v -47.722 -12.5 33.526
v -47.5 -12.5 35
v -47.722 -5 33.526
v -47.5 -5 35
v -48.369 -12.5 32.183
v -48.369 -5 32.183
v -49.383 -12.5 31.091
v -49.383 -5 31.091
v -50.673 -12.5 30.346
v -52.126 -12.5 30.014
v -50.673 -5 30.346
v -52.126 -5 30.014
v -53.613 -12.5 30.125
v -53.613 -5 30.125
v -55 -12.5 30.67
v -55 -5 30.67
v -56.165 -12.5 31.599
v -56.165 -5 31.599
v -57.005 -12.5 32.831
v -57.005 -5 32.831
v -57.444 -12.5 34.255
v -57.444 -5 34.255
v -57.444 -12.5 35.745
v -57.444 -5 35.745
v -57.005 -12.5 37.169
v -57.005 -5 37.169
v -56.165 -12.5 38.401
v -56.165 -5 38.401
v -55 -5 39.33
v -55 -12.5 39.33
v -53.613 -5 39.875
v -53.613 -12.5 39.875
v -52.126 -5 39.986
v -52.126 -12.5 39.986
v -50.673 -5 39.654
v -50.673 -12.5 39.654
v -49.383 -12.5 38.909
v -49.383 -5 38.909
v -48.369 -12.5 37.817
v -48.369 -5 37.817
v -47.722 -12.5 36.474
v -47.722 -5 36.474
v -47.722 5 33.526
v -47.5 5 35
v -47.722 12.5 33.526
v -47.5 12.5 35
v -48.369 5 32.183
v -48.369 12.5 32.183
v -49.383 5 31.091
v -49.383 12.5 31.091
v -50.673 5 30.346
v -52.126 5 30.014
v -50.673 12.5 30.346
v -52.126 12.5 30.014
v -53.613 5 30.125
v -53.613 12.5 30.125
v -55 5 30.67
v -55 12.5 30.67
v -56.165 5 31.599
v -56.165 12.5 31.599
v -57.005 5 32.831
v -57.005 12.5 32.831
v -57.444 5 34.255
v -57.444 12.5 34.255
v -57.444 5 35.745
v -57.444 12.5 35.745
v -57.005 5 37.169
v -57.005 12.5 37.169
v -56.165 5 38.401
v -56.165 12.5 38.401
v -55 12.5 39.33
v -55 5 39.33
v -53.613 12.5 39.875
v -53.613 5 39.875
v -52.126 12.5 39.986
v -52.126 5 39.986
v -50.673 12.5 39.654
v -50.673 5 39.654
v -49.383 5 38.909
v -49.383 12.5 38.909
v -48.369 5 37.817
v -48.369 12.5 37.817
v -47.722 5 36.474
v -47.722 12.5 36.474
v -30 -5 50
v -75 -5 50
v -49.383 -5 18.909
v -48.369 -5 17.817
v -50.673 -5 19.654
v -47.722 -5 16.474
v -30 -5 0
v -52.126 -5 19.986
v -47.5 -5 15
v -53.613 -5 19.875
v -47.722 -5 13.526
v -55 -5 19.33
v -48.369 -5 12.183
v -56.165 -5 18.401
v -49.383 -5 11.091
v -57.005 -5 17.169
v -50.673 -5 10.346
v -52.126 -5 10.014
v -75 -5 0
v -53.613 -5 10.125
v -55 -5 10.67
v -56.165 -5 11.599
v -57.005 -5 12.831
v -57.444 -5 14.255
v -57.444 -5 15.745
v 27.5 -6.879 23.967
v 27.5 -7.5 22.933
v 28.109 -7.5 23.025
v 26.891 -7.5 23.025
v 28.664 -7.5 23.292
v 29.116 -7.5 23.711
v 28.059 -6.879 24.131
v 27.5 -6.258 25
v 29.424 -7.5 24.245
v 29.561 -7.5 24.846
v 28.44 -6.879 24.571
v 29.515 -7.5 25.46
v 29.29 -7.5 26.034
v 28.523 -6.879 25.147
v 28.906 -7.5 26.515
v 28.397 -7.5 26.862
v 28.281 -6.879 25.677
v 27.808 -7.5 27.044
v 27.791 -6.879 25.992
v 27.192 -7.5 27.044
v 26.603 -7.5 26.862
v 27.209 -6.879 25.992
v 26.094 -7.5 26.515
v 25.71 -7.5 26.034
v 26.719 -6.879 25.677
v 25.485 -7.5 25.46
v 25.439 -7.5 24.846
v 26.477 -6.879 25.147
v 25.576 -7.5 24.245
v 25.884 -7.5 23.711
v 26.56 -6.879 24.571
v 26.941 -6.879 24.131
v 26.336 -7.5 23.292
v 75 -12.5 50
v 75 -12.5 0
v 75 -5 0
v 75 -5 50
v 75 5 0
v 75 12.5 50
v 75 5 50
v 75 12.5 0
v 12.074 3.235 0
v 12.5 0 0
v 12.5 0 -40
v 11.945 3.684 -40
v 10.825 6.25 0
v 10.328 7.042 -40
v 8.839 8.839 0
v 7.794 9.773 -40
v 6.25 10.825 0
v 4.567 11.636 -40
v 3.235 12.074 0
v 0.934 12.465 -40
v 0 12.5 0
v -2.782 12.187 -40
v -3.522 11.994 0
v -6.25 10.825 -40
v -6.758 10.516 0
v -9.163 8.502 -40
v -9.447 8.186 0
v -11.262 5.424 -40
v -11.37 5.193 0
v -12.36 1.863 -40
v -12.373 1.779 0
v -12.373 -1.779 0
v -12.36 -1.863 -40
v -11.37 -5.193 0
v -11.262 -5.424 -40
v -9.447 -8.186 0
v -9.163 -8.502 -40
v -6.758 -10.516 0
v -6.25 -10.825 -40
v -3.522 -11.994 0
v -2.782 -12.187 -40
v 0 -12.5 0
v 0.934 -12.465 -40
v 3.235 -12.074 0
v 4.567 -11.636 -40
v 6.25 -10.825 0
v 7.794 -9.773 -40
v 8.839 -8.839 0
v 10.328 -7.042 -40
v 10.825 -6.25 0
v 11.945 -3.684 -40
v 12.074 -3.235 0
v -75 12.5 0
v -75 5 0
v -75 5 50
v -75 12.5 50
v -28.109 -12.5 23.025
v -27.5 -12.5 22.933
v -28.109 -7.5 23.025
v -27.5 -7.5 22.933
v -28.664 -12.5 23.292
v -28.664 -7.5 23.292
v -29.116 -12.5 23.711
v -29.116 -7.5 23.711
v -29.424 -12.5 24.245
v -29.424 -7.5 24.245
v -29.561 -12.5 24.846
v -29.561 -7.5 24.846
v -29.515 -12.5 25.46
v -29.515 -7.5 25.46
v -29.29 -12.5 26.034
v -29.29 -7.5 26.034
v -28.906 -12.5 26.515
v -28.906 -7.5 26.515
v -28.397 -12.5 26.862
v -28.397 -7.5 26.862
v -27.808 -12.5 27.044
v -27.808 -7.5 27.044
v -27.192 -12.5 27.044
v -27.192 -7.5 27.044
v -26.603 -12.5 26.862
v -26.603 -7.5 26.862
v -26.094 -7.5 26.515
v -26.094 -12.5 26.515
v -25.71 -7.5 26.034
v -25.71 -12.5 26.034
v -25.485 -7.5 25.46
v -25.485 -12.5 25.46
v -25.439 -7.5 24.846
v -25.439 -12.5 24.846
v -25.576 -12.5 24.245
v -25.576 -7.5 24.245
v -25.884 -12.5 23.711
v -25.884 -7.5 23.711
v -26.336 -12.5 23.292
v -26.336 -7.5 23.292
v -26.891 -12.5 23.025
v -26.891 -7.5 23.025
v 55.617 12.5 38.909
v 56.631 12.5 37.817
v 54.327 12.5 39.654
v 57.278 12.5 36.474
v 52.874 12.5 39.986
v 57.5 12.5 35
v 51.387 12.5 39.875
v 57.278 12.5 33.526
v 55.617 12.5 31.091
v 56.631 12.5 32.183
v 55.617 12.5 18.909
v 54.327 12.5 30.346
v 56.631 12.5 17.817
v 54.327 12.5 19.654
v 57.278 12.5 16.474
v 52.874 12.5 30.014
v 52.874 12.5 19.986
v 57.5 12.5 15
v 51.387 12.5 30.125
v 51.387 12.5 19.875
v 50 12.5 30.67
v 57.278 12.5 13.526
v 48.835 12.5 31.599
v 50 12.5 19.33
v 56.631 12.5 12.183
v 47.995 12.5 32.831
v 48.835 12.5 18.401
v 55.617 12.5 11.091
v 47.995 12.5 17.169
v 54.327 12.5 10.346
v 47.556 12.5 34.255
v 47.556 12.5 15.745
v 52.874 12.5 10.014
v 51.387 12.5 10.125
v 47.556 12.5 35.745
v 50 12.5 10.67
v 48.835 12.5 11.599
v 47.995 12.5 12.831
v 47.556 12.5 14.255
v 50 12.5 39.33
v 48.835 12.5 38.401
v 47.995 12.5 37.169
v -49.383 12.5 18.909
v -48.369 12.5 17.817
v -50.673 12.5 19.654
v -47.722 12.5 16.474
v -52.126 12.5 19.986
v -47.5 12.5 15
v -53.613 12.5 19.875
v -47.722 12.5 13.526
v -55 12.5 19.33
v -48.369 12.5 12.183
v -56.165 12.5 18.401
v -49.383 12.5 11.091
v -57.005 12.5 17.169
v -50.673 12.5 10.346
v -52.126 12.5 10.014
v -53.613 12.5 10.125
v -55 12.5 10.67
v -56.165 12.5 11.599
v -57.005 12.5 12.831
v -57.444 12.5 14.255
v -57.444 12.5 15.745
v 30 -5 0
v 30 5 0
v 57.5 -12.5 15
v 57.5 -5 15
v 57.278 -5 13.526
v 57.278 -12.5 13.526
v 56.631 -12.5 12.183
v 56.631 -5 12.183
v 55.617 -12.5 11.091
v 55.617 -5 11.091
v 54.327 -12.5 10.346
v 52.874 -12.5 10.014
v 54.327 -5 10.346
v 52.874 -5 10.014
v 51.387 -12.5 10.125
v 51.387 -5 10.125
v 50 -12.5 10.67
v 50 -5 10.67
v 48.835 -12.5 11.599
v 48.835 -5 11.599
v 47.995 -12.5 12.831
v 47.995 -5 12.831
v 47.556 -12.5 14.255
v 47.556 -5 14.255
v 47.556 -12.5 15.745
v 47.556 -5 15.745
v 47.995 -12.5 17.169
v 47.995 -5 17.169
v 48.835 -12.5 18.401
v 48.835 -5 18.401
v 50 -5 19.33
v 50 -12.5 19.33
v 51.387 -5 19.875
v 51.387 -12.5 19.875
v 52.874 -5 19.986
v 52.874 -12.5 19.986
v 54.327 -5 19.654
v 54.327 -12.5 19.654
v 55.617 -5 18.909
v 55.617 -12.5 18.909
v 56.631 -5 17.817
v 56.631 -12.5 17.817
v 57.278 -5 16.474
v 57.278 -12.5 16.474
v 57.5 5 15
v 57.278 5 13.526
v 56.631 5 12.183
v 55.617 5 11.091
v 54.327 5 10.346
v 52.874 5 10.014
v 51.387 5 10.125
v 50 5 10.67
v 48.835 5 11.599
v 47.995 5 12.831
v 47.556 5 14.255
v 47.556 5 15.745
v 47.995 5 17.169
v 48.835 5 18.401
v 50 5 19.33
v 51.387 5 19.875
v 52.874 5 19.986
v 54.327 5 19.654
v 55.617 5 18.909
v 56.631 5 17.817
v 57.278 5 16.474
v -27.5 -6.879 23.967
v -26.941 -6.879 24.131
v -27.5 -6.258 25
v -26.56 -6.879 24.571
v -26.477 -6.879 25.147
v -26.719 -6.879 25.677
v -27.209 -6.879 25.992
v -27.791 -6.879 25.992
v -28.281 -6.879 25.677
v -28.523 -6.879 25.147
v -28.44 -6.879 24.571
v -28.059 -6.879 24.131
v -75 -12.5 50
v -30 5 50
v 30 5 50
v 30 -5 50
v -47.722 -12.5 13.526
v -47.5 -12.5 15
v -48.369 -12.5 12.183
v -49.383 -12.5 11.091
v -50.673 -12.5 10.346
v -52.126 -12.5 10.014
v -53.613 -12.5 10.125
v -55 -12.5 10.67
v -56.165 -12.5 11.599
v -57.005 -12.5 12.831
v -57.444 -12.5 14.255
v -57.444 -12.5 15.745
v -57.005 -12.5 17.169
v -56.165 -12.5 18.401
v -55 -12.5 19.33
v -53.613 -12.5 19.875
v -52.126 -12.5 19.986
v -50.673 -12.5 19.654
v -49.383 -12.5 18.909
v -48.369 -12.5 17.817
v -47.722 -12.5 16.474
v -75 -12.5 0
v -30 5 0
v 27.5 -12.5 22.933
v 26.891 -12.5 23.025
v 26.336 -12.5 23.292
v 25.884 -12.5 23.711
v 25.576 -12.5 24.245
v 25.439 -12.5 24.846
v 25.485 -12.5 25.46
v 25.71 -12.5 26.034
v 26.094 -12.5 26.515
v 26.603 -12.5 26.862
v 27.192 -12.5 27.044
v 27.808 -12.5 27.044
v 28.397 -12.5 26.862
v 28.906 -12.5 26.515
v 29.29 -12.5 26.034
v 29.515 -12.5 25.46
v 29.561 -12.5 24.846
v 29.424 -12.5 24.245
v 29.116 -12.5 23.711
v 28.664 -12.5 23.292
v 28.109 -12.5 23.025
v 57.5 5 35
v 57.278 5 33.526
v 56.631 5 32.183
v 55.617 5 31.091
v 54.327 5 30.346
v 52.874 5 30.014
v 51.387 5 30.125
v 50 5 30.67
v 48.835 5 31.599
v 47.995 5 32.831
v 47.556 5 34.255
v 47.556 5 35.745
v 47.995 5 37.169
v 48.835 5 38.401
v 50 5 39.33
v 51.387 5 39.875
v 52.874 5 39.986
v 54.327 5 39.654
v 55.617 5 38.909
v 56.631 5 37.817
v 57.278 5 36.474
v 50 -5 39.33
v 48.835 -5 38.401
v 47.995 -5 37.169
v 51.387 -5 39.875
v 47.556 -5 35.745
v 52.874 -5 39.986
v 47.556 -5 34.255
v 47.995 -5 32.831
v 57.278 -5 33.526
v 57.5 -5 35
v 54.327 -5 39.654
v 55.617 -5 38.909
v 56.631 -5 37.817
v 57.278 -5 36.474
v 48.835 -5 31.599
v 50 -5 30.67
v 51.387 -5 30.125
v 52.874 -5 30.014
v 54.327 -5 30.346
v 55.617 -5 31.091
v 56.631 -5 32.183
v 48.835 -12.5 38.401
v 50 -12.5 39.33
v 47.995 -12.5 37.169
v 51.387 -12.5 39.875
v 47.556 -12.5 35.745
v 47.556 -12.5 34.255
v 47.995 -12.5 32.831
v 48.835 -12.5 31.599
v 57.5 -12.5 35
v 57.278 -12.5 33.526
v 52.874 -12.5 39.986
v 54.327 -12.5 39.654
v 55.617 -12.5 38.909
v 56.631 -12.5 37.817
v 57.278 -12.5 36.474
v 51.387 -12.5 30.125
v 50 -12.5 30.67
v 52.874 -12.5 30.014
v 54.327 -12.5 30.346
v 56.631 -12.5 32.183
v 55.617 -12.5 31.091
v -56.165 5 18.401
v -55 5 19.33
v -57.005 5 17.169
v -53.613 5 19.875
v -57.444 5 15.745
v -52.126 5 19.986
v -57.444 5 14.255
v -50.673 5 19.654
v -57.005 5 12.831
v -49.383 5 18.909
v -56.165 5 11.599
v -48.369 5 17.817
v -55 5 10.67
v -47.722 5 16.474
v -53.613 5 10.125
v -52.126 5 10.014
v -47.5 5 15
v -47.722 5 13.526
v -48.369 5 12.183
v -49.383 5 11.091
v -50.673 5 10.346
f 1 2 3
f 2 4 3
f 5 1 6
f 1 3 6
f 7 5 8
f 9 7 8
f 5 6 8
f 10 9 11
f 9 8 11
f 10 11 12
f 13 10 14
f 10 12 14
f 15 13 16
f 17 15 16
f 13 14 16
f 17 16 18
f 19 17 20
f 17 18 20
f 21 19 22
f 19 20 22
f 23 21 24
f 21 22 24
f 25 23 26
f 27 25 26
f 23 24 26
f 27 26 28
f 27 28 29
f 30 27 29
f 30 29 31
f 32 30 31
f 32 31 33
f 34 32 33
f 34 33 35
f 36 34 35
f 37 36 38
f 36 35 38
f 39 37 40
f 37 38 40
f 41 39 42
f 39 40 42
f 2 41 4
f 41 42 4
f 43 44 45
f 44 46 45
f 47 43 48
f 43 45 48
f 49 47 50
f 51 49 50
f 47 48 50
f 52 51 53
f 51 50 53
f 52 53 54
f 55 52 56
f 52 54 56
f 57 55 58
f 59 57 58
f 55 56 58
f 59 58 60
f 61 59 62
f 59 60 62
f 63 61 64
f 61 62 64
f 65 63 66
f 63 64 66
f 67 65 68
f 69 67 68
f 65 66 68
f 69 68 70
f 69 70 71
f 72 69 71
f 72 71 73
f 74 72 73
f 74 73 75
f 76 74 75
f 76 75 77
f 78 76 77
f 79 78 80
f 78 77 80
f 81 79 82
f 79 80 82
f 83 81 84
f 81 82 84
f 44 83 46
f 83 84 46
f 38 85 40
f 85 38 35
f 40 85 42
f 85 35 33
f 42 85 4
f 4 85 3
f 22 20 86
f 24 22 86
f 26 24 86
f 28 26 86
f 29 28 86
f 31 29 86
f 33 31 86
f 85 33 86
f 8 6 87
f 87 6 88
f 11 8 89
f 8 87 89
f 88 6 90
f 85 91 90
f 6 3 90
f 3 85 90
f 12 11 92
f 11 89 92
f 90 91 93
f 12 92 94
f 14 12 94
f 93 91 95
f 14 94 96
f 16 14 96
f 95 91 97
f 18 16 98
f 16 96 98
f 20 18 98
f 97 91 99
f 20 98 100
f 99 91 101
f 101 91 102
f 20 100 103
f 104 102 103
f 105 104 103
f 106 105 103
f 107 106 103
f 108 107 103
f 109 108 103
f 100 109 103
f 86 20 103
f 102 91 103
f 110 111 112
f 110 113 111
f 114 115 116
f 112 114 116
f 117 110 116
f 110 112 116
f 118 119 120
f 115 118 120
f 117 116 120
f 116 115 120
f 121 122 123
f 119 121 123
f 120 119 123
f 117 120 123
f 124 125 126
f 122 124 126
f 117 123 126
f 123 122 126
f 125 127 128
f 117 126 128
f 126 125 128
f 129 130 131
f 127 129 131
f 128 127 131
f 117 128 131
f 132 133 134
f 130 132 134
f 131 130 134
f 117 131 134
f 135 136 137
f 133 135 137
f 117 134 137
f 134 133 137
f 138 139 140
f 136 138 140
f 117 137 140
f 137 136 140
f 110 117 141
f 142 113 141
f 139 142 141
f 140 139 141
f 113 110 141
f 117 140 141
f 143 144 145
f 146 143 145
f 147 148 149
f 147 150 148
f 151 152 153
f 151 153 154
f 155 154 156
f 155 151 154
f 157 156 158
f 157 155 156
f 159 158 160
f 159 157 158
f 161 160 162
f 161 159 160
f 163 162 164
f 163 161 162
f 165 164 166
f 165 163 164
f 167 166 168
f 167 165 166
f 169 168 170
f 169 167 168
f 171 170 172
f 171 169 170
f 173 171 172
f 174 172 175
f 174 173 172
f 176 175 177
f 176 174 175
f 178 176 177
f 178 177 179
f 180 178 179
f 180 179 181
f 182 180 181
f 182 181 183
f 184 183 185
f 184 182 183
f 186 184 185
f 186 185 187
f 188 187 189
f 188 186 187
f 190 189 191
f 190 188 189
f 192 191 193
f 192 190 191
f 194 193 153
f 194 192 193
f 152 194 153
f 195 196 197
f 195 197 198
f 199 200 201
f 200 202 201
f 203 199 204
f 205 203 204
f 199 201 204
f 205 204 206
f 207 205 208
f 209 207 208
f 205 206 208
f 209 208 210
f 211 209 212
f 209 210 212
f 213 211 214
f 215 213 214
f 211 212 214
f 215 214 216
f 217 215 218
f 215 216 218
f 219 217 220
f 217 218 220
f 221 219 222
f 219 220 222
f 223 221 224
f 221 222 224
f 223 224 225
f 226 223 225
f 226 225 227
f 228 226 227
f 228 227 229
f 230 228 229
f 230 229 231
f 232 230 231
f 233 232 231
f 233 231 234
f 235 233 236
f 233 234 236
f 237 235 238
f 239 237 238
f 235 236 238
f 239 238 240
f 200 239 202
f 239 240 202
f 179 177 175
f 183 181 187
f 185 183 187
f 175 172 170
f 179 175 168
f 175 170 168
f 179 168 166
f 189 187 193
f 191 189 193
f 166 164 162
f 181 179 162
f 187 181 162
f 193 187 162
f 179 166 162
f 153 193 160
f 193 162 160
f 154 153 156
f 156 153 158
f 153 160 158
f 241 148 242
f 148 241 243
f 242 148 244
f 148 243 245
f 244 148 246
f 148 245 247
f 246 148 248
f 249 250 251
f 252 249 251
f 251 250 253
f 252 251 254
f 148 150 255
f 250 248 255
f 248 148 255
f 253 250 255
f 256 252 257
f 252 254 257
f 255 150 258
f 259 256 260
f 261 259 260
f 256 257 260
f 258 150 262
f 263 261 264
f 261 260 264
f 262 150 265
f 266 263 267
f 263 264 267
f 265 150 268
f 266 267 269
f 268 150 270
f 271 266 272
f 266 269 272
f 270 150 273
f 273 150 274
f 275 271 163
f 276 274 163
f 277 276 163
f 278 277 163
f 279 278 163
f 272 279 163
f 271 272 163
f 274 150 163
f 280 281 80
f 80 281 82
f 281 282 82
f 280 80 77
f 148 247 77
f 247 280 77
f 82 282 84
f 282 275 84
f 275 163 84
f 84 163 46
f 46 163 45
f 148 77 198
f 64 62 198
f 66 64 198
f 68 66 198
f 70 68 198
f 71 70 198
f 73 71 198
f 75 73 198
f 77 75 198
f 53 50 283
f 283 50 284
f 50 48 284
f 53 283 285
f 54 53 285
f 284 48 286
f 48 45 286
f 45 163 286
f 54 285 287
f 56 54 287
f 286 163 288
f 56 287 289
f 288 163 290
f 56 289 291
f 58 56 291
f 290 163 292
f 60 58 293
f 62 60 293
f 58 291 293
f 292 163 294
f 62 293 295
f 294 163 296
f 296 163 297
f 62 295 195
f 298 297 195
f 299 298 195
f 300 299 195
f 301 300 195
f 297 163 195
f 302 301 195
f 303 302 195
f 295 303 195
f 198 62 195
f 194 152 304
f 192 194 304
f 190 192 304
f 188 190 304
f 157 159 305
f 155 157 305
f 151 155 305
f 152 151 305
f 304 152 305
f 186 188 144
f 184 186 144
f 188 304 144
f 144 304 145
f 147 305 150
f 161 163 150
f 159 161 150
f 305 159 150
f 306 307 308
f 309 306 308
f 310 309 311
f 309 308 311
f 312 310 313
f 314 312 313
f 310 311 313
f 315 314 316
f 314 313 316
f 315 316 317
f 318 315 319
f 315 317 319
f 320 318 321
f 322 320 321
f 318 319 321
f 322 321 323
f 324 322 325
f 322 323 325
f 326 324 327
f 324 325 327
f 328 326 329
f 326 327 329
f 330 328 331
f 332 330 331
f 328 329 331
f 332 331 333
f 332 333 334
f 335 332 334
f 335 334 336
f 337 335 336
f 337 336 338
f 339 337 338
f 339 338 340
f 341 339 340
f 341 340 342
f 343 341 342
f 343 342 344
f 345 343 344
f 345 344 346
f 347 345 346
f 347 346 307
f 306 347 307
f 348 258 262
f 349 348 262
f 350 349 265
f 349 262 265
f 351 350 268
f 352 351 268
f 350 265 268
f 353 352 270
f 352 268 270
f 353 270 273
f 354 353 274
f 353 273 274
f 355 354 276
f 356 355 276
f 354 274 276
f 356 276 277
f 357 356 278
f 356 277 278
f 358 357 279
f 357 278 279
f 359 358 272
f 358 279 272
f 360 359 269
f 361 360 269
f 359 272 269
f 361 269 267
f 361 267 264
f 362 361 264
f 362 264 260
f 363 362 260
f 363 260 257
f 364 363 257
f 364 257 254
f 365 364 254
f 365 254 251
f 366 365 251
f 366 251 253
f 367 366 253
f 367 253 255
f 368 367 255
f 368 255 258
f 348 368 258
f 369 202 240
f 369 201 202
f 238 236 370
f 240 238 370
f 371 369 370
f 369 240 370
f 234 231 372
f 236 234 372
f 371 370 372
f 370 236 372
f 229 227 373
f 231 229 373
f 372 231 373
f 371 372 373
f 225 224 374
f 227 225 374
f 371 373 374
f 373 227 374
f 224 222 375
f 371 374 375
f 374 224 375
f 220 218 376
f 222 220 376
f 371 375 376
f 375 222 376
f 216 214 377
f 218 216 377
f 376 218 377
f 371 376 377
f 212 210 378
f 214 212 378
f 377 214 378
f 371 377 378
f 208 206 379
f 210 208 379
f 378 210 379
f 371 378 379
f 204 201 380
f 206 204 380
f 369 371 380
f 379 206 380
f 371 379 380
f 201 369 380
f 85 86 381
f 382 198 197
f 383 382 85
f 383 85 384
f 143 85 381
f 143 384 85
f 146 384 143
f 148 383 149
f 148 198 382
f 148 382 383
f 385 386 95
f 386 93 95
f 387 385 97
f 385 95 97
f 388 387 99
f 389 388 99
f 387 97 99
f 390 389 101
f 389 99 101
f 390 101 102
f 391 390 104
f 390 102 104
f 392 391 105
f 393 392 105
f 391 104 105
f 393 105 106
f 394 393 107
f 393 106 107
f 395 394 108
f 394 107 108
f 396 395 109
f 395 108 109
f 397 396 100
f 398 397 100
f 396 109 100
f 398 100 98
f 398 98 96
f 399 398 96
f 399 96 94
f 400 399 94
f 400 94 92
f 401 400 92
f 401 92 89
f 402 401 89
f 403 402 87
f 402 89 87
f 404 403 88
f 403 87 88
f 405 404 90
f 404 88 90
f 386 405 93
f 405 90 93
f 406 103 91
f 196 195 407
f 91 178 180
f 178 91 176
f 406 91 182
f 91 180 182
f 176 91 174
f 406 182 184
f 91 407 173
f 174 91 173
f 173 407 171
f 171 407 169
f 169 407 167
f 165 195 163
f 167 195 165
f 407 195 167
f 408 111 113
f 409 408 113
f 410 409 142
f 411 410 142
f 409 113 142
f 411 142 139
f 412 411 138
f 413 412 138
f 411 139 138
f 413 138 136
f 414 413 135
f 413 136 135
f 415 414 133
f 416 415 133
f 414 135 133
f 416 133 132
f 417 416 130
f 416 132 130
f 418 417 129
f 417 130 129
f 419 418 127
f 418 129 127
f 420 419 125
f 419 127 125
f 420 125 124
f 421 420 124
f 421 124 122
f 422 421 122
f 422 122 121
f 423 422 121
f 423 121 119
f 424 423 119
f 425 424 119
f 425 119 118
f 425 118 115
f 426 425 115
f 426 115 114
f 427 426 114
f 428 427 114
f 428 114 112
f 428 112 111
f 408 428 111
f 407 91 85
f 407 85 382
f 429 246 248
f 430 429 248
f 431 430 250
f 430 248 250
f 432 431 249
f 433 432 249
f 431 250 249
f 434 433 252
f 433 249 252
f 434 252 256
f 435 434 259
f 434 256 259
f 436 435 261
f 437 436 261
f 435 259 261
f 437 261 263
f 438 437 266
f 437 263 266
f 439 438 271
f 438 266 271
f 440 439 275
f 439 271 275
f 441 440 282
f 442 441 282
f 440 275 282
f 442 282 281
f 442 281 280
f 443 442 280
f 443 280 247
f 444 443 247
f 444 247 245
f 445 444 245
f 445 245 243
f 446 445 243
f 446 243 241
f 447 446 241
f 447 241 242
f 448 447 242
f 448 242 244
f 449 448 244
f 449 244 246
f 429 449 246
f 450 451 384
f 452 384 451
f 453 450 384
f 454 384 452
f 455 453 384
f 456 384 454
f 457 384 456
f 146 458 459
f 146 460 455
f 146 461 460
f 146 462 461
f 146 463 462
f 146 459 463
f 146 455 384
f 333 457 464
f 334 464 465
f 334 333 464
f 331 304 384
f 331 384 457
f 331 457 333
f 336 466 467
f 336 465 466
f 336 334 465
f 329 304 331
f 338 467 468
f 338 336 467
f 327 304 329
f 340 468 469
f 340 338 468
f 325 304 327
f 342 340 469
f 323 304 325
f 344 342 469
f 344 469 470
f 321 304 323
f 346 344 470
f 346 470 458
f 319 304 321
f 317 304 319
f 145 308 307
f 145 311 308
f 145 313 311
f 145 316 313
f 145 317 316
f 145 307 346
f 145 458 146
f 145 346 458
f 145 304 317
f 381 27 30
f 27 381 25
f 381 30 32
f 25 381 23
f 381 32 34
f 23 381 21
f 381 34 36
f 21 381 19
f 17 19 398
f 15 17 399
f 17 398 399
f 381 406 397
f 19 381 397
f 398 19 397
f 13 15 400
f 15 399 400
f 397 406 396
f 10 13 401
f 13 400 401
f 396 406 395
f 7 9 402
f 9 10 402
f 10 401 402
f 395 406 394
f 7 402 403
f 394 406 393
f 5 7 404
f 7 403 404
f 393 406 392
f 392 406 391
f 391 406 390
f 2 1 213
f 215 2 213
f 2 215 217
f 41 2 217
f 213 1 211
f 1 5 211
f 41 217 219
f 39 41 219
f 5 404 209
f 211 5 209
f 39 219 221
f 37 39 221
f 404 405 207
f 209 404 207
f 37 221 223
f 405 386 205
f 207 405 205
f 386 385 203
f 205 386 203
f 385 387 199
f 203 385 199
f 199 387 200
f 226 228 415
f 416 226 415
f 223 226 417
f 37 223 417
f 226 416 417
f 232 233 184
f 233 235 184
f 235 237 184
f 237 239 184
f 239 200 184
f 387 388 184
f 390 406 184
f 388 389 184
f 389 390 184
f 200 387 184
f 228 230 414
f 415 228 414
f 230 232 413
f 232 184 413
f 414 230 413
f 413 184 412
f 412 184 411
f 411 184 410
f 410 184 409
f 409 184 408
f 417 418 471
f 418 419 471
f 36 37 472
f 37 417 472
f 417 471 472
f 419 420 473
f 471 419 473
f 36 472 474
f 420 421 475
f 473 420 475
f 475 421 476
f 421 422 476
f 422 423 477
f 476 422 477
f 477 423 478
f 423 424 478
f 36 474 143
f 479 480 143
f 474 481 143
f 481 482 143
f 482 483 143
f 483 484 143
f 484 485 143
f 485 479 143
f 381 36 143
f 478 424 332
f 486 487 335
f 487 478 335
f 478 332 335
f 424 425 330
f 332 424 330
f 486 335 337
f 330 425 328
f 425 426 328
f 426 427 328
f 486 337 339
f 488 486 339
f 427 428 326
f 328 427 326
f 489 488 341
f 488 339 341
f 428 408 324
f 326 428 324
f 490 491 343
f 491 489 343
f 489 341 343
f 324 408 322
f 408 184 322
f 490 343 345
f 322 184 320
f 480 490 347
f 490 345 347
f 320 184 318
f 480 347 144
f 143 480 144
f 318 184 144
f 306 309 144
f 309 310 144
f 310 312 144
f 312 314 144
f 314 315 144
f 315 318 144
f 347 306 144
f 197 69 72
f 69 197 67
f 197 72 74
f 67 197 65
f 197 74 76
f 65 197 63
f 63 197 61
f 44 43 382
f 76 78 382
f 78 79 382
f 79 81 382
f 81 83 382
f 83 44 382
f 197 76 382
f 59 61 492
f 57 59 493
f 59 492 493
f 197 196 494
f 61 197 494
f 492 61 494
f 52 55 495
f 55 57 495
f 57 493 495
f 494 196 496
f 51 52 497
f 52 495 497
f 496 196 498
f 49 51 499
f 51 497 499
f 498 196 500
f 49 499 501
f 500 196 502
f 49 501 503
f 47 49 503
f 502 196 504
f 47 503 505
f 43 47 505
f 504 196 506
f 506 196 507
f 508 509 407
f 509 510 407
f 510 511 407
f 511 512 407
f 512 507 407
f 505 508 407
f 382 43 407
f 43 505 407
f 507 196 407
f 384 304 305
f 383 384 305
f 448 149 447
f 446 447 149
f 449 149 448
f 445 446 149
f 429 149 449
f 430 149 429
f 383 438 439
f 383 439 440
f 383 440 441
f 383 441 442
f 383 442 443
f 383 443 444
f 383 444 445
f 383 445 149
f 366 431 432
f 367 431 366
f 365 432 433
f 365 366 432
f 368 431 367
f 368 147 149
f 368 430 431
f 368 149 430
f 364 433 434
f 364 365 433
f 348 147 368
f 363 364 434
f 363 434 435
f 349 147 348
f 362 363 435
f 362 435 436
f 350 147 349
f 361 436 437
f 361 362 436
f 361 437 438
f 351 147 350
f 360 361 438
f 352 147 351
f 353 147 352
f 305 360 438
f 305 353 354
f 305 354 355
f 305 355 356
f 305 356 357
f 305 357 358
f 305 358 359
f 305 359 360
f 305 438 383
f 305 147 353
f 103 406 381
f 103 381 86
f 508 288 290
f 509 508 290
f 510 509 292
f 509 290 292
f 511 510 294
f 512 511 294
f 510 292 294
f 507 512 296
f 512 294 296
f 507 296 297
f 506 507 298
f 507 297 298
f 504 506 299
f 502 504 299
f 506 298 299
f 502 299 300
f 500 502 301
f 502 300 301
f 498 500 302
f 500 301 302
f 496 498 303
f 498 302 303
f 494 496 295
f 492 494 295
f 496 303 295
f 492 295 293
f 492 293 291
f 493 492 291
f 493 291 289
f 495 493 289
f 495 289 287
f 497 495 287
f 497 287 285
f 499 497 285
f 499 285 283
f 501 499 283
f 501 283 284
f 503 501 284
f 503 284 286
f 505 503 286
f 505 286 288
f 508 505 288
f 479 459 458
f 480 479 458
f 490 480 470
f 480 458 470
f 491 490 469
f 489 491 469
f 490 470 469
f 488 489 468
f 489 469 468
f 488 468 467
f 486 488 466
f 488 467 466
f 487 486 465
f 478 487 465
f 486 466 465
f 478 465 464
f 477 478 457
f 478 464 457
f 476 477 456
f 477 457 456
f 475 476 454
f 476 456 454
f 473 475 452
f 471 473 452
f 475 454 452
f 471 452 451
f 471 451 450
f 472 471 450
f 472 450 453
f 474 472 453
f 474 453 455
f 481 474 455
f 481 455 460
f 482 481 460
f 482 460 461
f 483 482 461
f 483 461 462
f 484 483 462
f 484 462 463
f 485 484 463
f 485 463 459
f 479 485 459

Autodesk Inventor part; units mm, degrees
ref_plane "YZ Plane" through (0, 0, 0) normal (1, 0, 0) x (0, 1, 0)
ref_plane "XZ Plane" through (0, 0, 0) normal (0, 1, 0) x (-1, 0, 0)
ref_plane "XY Plane" through (0, 0, 0) normal (0, 0, 1) x (1, 0, 0)
sketch "Esboço1" plane through (0, 0, 0) normal (0, 0, 1) x (1, 0, 0)
  circle A0 centre (0, 0) radius 12.5
  arc A1 (0, 12.5) -> (0, 12.5) centre (0, 0) ccw
  line L0 (0, 12.5) -> (75, 12.5)
  line L1 (75, 12.5) -> (75, 5)
  line L2 (0, -12.5) -> (75, -12.5)
  line L3 (75, -12.5) -> (75, -5)
  line L4 (75, 5) -> (30, 5)
  line L5 (30, -5) -> (75, -5)
  line L6 (75, -5) -> (75, 5) construction
  line L7 (75, 0) -> (28.253, 0) construction
  line L8 (0, 0) -> (-5.8343, 0) construction
  arc A2 (11.9242, 3.75) -> (0, 12.5) centre (0, 0) ccw construction
  arc A3 (0, -12.5) -> (11.9242, -3.75) centre (0, 0) ccw construction
  arc A4 (11.9242, -3.75) -> (11.9242, 3.75) centre (0, 0) ccw construction
  line L9 (0, 0) -> (0, 31.0423) construction
  line L10 (0, 12.5) -> (-75, 12.5)
  line L11 (0, -12.5) -> (-75, -12.5)
  line L12 (-75, -12.5) -> (-75, -5)
  line L13 (-75, 5) -> (-30, 5)
  line L14 (-30, -5) -> (-75, -5)
  line L15 (-75, 5) -> (-75, 12.5)
  arc A5 (0, 12.5) -> (-11.9242, 3.75) centre (0, 0) ccw construction
  arc A6 (-11.9242, 3.75) -> (-11.9242, -3.75) centre (0, 0) ccw construction
  arc A7 (-11.9242, -3.75) -> (0, -12.5) centre (0, 0) ccw construction
  arc A8 (0, -12.5) -> (0, -12.5) centre (0, 0) ccw
  line L16 (30, -5) -> (30, 5)
  line L17 (-30, -5) -> (-30, 5)
  arc A9 (0, 12.5) -> (0, 12.5) centre (0, 22.5) ccw
  arc A10 (0, -12.5) -> (0, -12.5) centre (0, -22.5) ccw
  arc A11 (0, -12.5) -> (0, -12.5) centre (0, -22.5) ccw
  arc A12 (0, 12.5) -> (0, 12.5) centre (0, 22.5) ccw
  line L18 (-30, 0) -> (30, 0)
  line L19 (0, 0) -> (0, 17) construction
  dimension "d0" = 25
  dimension "d1" = 25
  dimension "d6" = 10
  dimension "d7" = 7.5
  dimension "d8" = 7.5
  dimension "d10" = 10
  dimension "d13" = 150
  dimension "d45" = 60
extrude "Extrusão1" add sketch "Esboço1" along normal blind 50 contours L18 A0 | L18 L16 L5 L3 L2 A0 | A0 L0 L1 L4 L16 L18 | A0 L18 | A0 L18 L17 L13 L15 L10 | L11 L12 L14 L17 L18 A0
extrude "Extrusão2" add sketch "Esboço1" against normal blind 40 contours L18 A0 | A0 L18
sketch "Esboço2" plane through (0, 12.5, 0) normal (0, 1, 0) x (1, 0, 0)
  circle A0 centre (52.5, -15) radius 5
  circle A1 centre (-52.5, -15) radius 5
  line L0 (75, 0) -> (75, -50) projected
  line L1 (-75, 0) -> (-75, -50) projected
  circle A2 centre (-52.5, -35) radius 5
  circle A3 centre (52.5, -35) radius 5
  line L2 (0, 0) -> (-75, 0) projected
  line L3 (-52.5, -35) -> (-52.5, -15) construction
  line L4 (75, 0) -> (0, 0) projected
  line L5 (52.5, -35) -> (52.5, -15) construction
  dimension "d17" = 10
  dimension "d18" = 10
  dimension "d22" = 150
  dimension "d23" = 22.5
  dimension "d29" = 22.5
  dimension "d38" = 10
  dimension "d40" = 20
  dimension "d41" = 10
  dimension "d44" = 20
  dimension "d63" = 15
  dimension "d64" = 15
extrude "Extrusão3" cut sketch "Esboço2" against normal up to surface (25 mm away)
sketch "Esboço4" plane through (-75, -12.5, 50) normal (0, -1, 0) x (1, 0, 0)
  circle A0 centre (47.5, -25) radius 2.5
  circle A1 centre (102.5, -25) radius 2.5
  line L0 (47.5, -25) -> (102.5, -25)
  line L1 (75, -25) -> (75, -15.8254)
  line L2 (150, 0) -> (0, 0) projected
  line L3 (75, 0) -> (75, 11.0535)
  line L4 (0, -50) -> (0, 0) projected
  line L5 (0, -25) -> (-11.4925, -25)
  point P0 (75, -50)
  dimension "d53" = 5
  dimension "d54" = 5
  dimension "d55" = 55
hole "Furo2" at (-27.5, -12.5, 25) at (27.5, -12.5, 25) direction (0, 1, 0) diameter 4.134 depth 5 tip angle 118 thread size "M5x0.8" class "6H" standard "ISO Metric profile"
equation "\"d8\" = d7"
equation "\"d29\" = d23"
equation "\"d38\" = d18"
equation "\"d41\" = d17"
properties part number "Junta"
